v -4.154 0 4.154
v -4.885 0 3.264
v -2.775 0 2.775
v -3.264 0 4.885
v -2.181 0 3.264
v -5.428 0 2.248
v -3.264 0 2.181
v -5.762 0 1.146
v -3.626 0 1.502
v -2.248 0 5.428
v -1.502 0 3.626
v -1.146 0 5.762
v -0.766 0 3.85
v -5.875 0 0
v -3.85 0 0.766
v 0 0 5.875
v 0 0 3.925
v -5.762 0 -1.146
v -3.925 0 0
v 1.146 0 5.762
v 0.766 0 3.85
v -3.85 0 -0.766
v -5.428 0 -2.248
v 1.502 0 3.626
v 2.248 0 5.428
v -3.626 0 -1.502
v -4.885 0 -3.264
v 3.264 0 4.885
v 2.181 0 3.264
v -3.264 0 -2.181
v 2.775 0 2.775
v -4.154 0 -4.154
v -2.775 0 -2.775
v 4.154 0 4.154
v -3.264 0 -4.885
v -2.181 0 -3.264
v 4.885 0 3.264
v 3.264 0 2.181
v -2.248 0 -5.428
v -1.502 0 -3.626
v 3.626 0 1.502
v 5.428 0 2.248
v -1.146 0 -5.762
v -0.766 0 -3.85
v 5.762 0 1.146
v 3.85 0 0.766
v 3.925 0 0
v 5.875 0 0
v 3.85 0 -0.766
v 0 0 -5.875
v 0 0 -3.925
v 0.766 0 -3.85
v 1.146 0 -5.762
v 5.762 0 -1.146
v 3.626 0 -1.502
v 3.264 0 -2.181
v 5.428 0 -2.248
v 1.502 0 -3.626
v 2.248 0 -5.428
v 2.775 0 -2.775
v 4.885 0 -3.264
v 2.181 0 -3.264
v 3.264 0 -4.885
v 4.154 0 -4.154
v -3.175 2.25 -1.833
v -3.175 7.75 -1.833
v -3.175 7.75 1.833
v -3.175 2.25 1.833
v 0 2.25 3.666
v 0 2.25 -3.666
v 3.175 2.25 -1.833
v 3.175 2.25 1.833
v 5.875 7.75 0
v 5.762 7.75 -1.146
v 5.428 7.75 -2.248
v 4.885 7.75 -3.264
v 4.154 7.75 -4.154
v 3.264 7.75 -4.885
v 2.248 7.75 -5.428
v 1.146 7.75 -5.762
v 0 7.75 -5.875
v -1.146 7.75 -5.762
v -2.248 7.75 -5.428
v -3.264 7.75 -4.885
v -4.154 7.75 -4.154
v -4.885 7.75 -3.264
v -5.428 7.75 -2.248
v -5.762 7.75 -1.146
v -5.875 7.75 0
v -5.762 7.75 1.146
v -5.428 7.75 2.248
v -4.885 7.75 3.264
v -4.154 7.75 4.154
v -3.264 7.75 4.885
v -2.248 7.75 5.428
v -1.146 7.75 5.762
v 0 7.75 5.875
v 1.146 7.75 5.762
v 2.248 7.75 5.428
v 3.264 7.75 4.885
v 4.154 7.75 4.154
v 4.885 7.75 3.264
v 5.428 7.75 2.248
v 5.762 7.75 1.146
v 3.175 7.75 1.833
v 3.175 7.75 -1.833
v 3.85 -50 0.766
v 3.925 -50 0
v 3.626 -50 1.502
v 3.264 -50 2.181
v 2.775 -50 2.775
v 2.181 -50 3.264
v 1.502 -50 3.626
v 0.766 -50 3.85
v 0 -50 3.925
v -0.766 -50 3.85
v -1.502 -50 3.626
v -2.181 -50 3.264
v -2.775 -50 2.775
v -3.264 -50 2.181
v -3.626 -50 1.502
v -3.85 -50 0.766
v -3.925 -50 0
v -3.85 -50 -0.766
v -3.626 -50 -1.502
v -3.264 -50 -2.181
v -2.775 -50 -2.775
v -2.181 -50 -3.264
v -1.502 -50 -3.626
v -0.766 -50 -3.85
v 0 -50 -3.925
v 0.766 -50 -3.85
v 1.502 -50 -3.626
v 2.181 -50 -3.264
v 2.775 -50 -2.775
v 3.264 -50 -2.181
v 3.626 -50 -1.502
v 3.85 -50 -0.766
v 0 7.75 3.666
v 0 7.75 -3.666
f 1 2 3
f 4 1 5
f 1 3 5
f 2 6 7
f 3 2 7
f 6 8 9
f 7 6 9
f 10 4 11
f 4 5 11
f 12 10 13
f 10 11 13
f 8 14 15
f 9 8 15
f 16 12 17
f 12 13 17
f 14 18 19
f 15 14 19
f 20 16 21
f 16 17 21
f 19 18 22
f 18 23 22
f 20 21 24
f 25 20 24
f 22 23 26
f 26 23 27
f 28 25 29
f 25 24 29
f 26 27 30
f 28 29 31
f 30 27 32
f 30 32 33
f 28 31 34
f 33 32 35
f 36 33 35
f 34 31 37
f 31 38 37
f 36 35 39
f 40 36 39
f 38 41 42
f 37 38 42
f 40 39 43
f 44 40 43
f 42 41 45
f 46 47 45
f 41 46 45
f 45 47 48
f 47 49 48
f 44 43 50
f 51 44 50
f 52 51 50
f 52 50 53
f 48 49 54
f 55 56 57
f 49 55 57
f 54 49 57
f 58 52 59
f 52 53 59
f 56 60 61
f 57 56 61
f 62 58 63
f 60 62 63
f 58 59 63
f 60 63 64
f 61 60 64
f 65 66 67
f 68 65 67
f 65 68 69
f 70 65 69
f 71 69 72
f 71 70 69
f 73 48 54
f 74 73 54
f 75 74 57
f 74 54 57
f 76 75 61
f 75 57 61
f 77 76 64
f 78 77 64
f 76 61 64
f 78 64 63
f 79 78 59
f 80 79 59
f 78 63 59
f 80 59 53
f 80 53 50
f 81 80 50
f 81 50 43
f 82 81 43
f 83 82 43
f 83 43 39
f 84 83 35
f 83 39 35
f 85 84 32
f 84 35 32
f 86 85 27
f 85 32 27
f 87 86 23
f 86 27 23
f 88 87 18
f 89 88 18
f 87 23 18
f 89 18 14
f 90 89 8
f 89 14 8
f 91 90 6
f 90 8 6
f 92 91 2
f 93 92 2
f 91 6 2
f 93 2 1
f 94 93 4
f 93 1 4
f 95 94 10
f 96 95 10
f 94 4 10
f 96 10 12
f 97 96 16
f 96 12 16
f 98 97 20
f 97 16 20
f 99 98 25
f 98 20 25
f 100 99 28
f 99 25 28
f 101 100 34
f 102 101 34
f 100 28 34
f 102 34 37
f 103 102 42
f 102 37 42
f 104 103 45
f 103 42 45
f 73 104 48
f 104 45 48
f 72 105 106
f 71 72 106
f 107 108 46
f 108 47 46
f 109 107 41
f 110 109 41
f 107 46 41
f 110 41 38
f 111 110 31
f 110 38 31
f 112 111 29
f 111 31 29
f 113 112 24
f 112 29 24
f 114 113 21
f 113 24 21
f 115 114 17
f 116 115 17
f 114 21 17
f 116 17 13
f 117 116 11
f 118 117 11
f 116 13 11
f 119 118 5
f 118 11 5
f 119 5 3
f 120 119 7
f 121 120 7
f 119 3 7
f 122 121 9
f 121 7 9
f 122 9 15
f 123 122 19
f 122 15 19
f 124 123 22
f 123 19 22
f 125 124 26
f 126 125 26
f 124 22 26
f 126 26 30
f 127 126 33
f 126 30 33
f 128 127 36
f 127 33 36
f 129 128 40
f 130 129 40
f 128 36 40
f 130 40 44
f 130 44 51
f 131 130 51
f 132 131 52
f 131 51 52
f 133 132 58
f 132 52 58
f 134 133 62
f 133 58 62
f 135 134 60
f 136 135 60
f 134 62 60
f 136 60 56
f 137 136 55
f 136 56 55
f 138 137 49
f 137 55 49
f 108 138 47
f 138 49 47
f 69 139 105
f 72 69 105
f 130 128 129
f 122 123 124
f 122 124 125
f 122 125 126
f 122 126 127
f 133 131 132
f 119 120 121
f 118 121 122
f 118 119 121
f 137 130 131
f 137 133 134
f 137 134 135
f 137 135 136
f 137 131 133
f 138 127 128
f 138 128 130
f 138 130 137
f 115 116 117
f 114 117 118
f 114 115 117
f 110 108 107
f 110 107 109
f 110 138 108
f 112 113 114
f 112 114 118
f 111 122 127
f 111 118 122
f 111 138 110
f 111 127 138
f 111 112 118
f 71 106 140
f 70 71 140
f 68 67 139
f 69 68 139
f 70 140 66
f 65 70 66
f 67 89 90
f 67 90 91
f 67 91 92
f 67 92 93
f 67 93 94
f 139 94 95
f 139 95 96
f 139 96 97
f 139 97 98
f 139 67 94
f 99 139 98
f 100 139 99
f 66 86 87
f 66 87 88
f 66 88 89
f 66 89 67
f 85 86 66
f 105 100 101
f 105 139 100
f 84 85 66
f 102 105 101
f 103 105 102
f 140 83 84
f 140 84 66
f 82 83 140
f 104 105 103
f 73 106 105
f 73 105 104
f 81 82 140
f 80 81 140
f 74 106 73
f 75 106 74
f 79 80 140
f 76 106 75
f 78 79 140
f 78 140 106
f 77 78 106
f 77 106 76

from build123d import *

# Parameters (mm, degrees)
SKETCH1_R           = 5.875
BOSS_EXTRUDE1_DEPTH = 7.75
CUT_EXTRUDE1_DEPTH  = 5.5
SKETCH3_R           = 3.925
BOSS_EXTRUDE2_DEPTH = 10
SKETCH4_R           = 3.925
BOSS_EXTRUDE3_DEPTH = 40


with BuildPart() as part:
    # Sketch1 → Boss-Extrude1 (new body)
    with BuildSketch(Plane(origin=(0, 0, 0), x_dir=(1, 0, 0), z_dir=(0, 1, 0))):
        Circle(SKETCH1_R)
    extrude(amount=BOSS_EXTRUDE1_DEPTH)

    # Sketch2 → Cut-Extrude1 (cut)
    with BuildSketch(Plane(origin=(0, 7.75, 0), x_dir=(1, 0, 0), z_dir=(0, 1, 0))):
        Polygon((0, 3.666174209), (-3.175, 1.833087105), (-3.175, -1.833087105), (0, -3.666174209), (3.175, -1.833087105), (3.175, 1.833087105), align=None)
    extrude(amount=-CUT_EXTRUDE1_DEPTH, mode=Mode.SUBTRACT)

    # Sketch3 → Boss-Extrude2 (add)
    with BuildSketch(Plane.XZ):
        Circle(SKETCH3_R)
    extrude(amount=BOSS_EXTRUDE2_DEPTH)

    # Sketch4 → Boss-Extrude3 (add)
    with BuildSketch(Plane.XZ.offset(10)):
        Circle(SKETCH4_R)
    extrude(amount=BOSS_EXTRUDE3_DEPTH)


solid = part.part
